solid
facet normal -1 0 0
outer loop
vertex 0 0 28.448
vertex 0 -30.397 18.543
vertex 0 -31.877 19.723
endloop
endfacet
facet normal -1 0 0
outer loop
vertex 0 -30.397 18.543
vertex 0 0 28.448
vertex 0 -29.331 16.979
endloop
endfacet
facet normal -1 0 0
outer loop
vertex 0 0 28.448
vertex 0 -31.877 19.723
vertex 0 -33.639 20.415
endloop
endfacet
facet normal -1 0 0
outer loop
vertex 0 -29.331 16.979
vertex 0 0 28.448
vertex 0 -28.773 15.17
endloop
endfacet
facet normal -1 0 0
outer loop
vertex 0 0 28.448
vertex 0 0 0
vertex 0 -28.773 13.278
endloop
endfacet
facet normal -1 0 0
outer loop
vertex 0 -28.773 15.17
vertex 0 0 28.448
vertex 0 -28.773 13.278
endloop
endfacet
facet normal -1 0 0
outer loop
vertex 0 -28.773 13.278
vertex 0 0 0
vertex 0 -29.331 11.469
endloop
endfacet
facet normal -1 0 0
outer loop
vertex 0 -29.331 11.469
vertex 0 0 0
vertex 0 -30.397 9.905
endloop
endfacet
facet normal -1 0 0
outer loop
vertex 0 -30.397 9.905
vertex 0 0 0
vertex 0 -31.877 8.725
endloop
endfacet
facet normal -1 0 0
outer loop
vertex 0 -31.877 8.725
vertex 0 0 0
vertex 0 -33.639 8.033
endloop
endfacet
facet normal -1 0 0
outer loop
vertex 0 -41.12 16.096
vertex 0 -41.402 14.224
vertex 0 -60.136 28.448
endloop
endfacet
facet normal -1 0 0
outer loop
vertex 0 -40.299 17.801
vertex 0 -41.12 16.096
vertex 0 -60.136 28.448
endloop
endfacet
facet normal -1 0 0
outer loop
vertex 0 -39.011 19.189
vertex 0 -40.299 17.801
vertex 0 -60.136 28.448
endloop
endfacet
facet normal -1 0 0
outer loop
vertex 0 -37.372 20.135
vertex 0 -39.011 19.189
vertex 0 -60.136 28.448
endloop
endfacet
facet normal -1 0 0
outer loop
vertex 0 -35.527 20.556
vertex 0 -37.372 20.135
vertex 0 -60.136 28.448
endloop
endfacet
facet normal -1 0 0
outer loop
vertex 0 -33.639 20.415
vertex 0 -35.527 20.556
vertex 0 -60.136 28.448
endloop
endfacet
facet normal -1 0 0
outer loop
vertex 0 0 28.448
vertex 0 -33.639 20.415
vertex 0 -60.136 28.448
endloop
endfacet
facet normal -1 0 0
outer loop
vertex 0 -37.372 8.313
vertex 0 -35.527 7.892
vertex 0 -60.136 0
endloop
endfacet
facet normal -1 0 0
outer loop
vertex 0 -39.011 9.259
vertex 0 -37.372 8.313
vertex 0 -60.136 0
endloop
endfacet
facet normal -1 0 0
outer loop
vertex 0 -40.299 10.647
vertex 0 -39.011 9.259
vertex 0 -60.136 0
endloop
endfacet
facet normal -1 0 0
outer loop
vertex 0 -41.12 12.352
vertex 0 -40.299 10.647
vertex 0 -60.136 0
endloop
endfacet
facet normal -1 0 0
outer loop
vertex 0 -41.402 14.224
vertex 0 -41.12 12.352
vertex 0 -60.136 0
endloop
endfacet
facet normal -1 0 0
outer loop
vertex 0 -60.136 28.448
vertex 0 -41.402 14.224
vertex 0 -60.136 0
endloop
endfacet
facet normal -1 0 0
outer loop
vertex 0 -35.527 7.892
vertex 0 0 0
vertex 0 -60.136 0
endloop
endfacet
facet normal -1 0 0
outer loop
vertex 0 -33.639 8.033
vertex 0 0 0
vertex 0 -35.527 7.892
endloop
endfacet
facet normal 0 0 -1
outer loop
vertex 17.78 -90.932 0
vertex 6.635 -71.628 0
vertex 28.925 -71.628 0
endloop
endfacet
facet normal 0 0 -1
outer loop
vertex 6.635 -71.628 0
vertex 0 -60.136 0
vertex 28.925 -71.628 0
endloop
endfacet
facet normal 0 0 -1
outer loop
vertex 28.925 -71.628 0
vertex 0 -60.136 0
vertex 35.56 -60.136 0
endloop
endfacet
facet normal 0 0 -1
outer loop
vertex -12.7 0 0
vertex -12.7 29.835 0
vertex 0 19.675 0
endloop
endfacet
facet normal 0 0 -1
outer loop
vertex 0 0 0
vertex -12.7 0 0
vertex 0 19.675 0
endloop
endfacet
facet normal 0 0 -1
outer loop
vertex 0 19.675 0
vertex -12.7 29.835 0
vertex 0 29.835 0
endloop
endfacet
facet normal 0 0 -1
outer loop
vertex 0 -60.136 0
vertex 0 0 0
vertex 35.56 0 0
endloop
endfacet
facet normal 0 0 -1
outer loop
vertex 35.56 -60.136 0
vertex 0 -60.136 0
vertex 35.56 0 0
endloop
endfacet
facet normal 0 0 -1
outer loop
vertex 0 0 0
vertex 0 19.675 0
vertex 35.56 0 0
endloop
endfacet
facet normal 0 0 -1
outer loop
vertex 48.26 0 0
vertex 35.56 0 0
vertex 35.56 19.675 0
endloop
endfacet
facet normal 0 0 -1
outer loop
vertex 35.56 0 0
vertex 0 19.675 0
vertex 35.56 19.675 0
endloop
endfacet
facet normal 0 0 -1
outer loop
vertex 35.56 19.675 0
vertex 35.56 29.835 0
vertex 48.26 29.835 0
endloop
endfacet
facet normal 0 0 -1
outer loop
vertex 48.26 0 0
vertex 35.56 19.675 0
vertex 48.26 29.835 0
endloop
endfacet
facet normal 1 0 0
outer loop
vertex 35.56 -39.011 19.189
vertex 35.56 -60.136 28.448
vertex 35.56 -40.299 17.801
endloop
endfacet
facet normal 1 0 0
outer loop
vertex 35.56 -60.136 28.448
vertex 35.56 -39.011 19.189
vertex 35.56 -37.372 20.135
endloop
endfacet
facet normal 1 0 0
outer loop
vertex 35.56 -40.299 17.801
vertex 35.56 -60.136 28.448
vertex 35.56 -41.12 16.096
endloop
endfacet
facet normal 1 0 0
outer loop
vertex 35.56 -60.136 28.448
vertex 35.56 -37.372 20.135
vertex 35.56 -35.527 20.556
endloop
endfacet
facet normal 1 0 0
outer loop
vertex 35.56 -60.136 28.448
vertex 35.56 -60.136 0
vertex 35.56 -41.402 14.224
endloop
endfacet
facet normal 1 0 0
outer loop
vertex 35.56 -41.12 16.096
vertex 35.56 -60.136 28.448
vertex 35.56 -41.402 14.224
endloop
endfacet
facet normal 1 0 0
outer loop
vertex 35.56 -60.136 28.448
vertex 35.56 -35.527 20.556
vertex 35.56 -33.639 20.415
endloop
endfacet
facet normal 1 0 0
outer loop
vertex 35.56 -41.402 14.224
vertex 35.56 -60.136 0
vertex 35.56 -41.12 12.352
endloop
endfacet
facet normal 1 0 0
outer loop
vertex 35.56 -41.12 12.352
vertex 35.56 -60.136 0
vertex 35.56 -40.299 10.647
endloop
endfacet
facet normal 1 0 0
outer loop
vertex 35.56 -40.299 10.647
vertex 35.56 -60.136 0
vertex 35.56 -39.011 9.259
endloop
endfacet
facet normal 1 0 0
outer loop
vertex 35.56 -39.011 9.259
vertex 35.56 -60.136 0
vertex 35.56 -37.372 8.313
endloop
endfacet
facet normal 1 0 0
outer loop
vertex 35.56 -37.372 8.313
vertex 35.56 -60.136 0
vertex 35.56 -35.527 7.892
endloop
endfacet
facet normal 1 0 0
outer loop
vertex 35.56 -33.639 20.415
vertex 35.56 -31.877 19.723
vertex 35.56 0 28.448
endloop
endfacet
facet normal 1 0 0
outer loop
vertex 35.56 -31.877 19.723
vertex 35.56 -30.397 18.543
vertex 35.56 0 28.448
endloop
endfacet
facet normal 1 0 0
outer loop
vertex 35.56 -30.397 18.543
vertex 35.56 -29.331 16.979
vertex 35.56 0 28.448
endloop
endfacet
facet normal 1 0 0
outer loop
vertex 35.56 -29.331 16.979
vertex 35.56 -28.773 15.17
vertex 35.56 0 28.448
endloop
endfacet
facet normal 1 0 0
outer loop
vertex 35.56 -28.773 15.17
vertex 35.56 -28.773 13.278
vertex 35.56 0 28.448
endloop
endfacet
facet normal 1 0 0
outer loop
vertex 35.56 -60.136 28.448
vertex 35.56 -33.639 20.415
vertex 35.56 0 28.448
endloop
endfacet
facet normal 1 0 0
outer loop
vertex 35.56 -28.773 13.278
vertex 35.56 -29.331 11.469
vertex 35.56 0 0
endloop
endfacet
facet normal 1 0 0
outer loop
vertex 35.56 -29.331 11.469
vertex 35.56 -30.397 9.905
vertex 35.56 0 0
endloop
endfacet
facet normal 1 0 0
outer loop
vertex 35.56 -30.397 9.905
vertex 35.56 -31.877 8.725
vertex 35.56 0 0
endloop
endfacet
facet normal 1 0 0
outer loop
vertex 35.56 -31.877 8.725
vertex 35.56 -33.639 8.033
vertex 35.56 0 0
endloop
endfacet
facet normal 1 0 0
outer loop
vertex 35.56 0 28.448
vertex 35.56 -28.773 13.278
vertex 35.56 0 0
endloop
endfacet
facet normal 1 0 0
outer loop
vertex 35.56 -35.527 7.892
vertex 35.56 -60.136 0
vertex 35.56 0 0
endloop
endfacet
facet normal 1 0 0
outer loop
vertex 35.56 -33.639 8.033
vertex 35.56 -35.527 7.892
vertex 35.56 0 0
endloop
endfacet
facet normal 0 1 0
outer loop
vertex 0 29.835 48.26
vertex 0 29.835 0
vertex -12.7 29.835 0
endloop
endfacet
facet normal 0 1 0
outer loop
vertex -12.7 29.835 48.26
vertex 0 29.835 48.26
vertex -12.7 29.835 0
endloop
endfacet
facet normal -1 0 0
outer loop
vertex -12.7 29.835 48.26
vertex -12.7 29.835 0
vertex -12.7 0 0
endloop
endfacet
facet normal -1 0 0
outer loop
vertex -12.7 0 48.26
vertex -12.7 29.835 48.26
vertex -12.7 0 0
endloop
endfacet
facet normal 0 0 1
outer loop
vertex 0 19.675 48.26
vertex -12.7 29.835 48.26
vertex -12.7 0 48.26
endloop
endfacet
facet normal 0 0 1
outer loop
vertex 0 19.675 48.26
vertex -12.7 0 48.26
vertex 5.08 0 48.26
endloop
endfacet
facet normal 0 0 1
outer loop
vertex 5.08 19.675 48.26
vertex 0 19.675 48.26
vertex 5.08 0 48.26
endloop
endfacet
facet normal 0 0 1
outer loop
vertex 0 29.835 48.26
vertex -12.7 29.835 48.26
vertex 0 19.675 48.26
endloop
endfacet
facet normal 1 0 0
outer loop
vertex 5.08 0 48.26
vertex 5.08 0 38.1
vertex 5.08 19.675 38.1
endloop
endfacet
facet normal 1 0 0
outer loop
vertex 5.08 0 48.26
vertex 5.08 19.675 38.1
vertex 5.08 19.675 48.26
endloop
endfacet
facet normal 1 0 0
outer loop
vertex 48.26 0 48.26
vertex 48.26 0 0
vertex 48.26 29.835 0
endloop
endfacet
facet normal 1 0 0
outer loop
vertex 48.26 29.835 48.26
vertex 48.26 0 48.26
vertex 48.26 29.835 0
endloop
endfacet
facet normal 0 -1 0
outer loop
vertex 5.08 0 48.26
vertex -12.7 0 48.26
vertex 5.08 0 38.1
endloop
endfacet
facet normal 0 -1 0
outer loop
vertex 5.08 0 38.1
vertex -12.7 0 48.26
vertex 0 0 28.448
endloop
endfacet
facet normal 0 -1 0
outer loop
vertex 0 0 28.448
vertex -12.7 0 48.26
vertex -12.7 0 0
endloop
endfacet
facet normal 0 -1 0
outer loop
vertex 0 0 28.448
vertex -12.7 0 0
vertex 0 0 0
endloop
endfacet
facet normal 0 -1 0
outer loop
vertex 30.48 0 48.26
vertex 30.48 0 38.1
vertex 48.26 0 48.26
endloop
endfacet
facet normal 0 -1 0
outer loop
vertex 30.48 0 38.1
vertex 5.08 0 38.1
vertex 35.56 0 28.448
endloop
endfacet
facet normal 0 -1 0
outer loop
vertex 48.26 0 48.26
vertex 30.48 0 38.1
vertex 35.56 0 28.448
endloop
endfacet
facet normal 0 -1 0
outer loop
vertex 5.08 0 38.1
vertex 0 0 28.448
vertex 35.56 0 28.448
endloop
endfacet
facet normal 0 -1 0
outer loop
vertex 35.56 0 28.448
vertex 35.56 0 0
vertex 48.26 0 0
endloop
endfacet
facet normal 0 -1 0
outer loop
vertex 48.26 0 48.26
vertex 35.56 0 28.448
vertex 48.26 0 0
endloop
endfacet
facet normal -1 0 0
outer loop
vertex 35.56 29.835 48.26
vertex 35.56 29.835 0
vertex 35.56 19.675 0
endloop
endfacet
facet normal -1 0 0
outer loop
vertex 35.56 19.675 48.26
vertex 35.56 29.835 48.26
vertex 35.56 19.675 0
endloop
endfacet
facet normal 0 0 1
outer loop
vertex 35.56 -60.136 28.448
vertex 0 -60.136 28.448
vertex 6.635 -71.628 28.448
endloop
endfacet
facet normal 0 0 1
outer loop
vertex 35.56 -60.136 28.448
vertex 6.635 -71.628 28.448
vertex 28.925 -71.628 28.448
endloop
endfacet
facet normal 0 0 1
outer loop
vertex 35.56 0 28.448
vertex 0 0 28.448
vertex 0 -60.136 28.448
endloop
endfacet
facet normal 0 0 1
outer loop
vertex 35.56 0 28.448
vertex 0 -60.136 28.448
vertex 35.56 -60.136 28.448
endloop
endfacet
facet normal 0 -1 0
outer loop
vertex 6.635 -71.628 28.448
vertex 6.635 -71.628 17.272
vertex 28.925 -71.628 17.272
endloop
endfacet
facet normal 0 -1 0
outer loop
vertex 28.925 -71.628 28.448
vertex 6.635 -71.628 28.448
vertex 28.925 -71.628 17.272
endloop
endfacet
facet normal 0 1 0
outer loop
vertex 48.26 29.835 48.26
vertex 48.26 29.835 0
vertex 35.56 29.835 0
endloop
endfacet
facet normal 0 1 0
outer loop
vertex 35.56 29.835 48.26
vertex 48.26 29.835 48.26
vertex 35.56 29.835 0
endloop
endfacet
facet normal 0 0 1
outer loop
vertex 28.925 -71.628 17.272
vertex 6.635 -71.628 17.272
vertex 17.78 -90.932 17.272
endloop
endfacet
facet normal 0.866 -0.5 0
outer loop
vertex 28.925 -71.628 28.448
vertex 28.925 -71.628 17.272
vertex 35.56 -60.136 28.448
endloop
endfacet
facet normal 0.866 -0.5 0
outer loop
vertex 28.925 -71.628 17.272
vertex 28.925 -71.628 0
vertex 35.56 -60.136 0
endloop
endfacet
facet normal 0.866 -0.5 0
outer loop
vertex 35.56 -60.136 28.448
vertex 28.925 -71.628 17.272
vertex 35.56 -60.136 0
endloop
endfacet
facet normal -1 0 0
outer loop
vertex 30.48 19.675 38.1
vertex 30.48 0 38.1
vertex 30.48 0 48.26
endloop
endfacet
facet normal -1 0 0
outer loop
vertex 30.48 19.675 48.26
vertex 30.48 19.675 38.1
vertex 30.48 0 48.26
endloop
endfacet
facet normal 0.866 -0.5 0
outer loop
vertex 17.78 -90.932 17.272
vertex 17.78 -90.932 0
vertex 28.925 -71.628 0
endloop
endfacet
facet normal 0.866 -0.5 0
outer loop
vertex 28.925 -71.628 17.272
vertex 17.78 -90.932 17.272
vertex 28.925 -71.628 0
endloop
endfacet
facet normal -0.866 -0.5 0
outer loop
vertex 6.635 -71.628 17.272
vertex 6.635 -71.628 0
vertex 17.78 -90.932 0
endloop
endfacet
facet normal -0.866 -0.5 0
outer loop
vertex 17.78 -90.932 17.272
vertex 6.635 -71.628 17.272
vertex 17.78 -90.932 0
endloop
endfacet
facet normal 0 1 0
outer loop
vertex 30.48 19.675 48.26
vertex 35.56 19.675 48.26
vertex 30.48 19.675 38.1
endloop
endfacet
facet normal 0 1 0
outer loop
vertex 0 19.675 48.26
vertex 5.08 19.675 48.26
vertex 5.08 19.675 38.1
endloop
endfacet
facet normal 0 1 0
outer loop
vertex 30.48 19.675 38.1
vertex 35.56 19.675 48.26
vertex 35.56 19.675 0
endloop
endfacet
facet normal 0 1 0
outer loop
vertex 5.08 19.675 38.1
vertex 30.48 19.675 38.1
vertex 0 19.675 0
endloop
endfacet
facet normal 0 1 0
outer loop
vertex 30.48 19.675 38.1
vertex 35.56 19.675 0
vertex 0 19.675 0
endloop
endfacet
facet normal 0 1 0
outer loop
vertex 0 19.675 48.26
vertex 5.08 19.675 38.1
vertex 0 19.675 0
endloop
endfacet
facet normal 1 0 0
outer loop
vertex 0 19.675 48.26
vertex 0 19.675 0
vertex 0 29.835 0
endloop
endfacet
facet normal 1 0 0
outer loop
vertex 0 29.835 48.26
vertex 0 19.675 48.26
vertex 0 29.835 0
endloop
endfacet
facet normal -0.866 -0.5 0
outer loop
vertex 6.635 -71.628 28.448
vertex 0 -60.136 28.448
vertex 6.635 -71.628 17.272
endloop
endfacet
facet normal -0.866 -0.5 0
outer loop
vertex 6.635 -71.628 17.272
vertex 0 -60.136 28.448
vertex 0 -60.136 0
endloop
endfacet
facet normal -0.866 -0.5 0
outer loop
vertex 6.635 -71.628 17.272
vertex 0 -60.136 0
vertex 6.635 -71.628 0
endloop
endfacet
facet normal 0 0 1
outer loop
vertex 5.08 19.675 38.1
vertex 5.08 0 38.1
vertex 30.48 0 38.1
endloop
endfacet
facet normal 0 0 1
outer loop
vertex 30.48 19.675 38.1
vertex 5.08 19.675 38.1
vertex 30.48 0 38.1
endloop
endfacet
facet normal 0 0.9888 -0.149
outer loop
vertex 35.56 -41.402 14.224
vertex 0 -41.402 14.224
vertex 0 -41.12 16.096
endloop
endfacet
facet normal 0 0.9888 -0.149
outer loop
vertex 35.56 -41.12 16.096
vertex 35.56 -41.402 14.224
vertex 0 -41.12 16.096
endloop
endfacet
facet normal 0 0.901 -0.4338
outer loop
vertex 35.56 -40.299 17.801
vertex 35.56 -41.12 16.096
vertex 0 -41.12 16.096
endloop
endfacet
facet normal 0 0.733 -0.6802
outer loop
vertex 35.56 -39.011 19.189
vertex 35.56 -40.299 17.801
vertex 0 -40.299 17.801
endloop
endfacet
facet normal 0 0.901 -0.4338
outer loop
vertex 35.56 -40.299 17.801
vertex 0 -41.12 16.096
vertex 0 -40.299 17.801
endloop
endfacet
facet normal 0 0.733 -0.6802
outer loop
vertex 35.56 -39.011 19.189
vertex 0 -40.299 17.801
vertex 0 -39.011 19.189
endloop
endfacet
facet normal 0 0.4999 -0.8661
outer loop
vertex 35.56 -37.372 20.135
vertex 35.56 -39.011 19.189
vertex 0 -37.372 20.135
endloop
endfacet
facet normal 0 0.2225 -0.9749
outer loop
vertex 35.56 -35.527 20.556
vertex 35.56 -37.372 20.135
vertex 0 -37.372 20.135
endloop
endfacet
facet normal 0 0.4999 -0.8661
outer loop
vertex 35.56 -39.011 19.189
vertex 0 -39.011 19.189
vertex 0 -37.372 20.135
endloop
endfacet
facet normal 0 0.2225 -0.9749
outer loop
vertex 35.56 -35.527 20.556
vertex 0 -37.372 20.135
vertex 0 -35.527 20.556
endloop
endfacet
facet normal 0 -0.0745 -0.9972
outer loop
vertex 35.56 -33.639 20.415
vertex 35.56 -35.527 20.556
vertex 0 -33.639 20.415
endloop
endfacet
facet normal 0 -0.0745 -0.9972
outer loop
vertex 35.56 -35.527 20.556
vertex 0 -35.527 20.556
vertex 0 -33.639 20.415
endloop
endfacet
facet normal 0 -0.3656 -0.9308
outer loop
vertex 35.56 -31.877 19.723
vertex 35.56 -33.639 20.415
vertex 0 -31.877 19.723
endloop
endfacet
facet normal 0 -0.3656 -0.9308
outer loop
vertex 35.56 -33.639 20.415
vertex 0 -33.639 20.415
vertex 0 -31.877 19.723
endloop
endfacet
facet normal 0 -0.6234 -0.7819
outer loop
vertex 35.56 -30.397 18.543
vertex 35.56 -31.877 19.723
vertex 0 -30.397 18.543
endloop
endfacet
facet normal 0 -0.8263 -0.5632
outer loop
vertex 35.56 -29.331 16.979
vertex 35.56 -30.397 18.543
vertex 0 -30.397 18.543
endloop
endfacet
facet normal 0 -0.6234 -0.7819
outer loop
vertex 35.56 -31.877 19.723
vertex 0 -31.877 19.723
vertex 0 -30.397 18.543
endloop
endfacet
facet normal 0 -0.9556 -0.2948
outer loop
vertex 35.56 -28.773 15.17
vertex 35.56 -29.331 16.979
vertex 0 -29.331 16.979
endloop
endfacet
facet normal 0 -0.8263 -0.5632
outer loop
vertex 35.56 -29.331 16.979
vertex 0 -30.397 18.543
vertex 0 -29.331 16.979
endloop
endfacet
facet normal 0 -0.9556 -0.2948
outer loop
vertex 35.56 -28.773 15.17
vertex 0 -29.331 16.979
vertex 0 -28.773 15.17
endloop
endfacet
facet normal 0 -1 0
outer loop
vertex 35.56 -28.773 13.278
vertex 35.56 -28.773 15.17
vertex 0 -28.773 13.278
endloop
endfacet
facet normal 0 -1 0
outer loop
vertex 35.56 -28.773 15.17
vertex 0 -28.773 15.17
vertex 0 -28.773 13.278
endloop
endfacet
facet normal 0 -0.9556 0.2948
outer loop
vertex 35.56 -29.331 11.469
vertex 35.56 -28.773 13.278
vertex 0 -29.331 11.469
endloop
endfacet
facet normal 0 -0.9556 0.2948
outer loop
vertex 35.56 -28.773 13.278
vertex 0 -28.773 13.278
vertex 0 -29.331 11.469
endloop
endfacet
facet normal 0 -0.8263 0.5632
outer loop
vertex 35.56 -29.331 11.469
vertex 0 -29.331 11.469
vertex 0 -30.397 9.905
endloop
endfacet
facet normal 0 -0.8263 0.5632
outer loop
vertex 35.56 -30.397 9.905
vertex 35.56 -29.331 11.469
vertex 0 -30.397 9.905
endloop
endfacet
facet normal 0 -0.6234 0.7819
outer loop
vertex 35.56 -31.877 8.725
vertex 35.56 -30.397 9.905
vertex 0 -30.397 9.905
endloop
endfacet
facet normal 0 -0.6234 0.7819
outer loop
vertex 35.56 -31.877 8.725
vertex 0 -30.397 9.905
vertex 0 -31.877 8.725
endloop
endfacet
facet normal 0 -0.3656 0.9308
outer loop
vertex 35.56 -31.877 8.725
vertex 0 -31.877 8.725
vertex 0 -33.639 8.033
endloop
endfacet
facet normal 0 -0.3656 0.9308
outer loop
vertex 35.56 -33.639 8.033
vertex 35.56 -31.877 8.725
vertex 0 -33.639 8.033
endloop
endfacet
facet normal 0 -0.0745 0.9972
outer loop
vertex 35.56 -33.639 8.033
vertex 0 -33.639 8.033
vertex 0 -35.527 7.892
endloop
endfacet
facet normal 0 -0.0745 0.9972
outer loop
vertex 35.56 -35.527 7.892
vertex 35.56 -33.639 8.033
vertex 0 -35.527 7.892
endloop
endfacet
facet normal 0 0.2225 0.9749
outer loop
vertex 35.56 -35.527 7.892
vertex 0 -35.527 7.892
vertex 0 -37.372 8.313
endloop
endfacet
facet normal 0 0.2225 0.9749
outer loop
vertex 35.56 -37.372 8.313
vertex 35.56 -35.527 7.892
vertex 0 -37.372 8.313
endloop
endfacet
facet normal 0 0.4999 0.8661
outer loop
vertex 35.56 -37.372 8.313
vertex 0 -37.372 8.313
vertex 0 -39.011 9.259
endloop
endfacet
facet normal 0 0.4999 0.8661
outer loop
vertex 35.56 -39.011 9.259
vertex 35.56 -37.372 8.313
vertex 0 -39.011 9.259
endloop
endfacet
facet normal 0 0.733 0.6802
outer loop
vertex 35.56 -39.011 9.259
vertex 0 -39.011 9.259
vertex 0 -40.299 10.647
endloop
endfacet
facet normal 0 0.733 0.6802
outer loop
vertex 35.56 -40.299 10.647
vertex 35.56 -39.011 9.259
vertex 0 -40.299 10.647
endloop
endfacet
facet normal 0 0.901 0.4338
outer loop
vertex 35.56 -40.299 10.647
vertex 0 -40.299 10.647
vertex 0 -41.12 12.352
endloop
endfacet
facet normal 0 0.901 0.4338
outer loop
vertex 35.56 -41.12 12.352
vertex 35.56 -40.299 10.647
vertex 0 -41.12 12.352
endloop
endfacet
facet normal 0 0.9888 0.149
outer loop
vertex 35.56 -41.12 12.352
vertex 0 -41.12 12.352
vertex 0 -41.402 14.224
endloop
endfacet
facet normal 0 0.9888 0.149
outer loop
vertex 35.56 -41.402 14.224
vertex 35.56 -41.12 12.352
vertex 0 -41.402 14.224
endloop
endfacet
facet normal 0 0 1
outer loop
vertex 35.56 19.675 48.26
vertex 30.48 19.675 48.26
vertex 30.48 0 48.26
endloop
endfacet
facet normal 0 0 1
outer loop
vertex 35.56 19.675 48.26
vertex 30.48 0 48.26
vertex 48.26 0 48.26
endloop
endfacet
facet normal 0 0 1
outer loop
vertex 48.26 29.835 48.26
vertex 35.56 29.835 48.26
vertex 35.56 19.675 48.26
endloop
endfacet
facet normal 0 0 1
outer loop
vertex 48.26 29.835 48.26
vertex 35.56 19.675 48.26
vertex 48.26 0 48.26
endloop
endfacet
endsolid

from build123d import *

# Parameters (mm, degrees)
F1_DEPTH = 48.26
F2_DEPTH = 28.448
F3_DEPTH = 17.272
F4_W     = 25.4
F4_H     = 10.16
F5_DEPTH = 25.4
F6_R     = 6.35
F7_DEPTH = 48.261


with BuildPart() as f1:
    # F0 (on Top) → F1 (new body)
    with BuildSketch(Plane.XY):
        Polygon((-12.7, 0), (0, 0), (35.56, 0), (48.26, 0), (48.26, 29.835004), (35.56, 29.835004), (35.56, 19.675004), (0, 19.675004), (0, 29.835004), (-12.7, 29.835004), align=None)
    extrude(amount=F1_DEPTH)

    # F0 (on Top) → F2 (join)
    with BuildSketch(Plane.XY):
        Polygon((35.56, 0), (0, 0), (0, -60.136137), (6.63483, -71.628), (28.92517, -71.628), (35.56, -60.136137), align=None)
    extrude(amount=F2_DEPTH)

    # F0 (on Top) → F3 (join)
    with BuildSketch(Plane.XY):
        Polygon((28.92517, -71.628), (6.63483, -71.628), (17.78, -90.932), align=None)
    extrude(amount=F3_DEPTH)

    # F4 (on face) → F5 (cut)
    with BuildSketch(Plane.XZ):
        with Locations((17.78, 43.18)):
            Rectangle(F4_W, F4_H)
    extrude(amount=-F5_DEPTH, mode=Mode.SUBTRACT)

    # F6 (on face) → F7 (cut, through all)
    with BuildSketch(Plane(origin=(0, 0, 0), x_dir=(0, -1, 0), z_dir=(-1, 0, 0))):
        with Locations((35.052, 14.224)):
            Circle(F6_R)
    extrude(amount=-F7_DEPTH, mode=Mode.SUBTRACT)


solid = f1.part
